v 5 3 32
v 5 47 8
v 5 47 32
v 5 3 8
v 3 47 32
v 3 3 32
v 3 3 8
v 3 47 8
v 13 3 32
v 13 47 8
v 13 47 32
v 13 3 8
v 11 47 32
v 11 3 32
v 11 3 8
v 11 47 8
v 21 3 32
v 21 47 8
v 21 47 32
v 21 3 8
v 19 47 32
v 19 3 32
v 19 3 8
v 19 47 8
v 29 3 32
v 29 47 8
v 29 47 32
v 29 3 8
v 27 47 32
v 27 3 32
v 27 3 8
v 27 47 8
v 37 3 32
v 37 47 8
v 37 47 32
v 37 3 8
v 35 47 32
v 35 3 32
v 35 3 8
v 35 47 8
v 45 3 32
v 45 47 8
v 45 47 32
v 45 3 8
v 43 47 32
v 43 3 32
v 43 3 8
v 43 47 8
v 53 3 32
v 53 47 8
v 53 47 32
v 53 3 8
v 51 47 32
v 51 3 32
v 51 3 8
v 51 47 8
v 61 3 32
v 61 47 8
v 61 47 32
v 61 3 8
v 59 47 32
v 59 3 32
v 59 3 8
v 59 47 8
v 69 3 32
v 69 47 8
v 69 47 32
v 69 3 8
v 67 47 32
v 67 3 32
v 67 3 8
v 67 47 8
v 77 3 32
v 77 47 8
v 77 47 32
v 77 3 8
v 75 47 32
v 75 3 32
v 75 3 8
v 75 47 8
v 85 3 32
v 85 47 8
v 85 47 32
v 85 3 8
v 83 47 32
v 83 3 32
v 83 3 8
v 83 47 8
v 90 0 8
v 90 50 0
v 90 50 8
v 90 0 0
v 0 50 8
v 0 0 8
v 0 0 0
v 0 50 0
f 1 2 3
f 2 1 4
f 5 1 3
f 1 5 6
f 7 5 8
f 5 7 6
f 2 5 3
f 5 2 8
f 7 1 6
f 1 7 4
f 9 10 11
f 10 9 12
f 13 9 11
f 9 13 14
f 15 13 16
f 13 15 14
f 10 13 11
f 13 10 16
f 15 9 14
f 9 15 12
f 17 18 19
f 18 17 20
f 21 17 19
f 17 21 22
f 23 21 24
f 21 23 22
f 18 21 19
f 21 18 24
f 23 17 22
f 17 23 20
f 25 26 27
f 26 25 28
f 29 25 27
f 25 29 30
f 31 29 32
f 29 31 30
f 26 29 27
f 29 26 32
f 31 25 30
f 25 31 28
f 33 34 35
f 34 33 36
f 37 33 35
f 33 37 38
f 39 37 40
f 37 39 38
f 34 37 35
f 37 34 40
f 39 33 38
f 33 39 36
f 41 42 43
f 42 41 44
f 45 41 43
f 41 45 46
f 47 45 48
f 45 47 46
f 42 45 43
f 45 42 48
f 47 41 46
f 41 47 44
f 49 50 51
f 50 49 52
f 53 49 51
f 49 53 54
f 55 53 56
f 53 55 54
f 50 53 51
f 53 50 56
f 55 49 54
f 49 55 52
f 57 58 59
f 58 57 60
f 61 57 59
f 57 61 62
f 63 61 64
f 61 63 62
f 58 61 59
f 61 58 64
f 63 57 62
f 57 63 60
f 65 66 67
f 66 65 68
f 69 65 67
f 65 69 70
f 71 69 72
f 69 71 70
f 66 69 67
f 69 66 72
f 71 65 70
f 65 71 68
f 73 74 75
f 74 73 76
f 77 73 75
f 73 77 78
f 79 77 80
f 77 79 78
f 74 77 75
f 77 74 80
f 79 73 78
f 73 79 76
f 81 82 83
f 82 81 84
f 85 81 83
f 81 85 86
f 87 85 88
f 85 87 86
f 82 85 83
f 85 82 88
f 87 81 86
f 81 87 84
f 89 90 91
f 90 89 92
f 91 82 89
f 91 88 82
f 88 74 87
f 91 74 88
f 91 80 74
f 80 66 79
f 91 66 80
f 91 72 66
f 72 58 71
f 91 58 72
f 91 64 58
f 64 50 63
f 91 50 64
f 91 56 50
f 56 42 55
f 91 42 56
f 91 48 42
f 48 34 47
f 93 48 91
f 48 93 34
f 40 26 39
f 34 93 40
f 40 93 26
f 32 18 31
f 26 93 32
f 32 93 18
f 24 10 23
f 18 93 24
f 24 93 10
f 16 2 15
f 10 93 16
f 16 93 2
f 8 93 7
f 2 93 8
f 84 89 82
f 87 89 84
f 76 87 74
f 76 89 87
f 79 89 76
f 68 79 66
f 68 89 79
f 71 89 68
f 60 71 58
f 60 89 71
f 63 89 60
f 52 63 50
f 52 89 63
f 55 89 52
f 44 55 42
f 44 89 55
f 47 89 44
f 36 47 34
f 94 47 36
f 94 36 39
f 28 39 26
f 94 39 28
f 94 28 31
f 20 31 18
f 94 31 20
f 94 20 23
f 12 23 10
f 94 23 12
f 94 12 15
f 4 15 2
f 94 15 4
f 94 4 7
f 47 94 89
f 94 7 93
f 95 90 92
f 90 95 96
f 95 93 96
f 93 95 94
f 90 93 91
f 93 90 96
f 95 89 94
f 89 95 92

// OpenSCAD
$fn = 32;

// ----------------------------------------------------------------------
// Heatsink: uniform fin block
// ----------------------------------------------------------------------

// --- parameters (mm) ---
base_l = 90;              // base length, X
base_w = 50;              // base width, Y
base_t = 8;               // base plate thickness
fin_h = 25;               // fin height above the base
fin_t = 2;                // fin thickness
edge = 3;                 // margin from the base ends
pitch = 8;                // fin pitch

n_fins = floor((base_l - 2 * edge - fin_t) / pitch) + 1;  // fin count
total_h = base_t + fin_h - 1;  // overall height

union() {
  cube([base_l, base_w, base_t]);
  for (i = [0 : n_fins - 1])
    translate([edge + i * pitch, edge, base_t - 1])
      cube([fin_t, base_w - 2 * edge, fin_h]);
}
